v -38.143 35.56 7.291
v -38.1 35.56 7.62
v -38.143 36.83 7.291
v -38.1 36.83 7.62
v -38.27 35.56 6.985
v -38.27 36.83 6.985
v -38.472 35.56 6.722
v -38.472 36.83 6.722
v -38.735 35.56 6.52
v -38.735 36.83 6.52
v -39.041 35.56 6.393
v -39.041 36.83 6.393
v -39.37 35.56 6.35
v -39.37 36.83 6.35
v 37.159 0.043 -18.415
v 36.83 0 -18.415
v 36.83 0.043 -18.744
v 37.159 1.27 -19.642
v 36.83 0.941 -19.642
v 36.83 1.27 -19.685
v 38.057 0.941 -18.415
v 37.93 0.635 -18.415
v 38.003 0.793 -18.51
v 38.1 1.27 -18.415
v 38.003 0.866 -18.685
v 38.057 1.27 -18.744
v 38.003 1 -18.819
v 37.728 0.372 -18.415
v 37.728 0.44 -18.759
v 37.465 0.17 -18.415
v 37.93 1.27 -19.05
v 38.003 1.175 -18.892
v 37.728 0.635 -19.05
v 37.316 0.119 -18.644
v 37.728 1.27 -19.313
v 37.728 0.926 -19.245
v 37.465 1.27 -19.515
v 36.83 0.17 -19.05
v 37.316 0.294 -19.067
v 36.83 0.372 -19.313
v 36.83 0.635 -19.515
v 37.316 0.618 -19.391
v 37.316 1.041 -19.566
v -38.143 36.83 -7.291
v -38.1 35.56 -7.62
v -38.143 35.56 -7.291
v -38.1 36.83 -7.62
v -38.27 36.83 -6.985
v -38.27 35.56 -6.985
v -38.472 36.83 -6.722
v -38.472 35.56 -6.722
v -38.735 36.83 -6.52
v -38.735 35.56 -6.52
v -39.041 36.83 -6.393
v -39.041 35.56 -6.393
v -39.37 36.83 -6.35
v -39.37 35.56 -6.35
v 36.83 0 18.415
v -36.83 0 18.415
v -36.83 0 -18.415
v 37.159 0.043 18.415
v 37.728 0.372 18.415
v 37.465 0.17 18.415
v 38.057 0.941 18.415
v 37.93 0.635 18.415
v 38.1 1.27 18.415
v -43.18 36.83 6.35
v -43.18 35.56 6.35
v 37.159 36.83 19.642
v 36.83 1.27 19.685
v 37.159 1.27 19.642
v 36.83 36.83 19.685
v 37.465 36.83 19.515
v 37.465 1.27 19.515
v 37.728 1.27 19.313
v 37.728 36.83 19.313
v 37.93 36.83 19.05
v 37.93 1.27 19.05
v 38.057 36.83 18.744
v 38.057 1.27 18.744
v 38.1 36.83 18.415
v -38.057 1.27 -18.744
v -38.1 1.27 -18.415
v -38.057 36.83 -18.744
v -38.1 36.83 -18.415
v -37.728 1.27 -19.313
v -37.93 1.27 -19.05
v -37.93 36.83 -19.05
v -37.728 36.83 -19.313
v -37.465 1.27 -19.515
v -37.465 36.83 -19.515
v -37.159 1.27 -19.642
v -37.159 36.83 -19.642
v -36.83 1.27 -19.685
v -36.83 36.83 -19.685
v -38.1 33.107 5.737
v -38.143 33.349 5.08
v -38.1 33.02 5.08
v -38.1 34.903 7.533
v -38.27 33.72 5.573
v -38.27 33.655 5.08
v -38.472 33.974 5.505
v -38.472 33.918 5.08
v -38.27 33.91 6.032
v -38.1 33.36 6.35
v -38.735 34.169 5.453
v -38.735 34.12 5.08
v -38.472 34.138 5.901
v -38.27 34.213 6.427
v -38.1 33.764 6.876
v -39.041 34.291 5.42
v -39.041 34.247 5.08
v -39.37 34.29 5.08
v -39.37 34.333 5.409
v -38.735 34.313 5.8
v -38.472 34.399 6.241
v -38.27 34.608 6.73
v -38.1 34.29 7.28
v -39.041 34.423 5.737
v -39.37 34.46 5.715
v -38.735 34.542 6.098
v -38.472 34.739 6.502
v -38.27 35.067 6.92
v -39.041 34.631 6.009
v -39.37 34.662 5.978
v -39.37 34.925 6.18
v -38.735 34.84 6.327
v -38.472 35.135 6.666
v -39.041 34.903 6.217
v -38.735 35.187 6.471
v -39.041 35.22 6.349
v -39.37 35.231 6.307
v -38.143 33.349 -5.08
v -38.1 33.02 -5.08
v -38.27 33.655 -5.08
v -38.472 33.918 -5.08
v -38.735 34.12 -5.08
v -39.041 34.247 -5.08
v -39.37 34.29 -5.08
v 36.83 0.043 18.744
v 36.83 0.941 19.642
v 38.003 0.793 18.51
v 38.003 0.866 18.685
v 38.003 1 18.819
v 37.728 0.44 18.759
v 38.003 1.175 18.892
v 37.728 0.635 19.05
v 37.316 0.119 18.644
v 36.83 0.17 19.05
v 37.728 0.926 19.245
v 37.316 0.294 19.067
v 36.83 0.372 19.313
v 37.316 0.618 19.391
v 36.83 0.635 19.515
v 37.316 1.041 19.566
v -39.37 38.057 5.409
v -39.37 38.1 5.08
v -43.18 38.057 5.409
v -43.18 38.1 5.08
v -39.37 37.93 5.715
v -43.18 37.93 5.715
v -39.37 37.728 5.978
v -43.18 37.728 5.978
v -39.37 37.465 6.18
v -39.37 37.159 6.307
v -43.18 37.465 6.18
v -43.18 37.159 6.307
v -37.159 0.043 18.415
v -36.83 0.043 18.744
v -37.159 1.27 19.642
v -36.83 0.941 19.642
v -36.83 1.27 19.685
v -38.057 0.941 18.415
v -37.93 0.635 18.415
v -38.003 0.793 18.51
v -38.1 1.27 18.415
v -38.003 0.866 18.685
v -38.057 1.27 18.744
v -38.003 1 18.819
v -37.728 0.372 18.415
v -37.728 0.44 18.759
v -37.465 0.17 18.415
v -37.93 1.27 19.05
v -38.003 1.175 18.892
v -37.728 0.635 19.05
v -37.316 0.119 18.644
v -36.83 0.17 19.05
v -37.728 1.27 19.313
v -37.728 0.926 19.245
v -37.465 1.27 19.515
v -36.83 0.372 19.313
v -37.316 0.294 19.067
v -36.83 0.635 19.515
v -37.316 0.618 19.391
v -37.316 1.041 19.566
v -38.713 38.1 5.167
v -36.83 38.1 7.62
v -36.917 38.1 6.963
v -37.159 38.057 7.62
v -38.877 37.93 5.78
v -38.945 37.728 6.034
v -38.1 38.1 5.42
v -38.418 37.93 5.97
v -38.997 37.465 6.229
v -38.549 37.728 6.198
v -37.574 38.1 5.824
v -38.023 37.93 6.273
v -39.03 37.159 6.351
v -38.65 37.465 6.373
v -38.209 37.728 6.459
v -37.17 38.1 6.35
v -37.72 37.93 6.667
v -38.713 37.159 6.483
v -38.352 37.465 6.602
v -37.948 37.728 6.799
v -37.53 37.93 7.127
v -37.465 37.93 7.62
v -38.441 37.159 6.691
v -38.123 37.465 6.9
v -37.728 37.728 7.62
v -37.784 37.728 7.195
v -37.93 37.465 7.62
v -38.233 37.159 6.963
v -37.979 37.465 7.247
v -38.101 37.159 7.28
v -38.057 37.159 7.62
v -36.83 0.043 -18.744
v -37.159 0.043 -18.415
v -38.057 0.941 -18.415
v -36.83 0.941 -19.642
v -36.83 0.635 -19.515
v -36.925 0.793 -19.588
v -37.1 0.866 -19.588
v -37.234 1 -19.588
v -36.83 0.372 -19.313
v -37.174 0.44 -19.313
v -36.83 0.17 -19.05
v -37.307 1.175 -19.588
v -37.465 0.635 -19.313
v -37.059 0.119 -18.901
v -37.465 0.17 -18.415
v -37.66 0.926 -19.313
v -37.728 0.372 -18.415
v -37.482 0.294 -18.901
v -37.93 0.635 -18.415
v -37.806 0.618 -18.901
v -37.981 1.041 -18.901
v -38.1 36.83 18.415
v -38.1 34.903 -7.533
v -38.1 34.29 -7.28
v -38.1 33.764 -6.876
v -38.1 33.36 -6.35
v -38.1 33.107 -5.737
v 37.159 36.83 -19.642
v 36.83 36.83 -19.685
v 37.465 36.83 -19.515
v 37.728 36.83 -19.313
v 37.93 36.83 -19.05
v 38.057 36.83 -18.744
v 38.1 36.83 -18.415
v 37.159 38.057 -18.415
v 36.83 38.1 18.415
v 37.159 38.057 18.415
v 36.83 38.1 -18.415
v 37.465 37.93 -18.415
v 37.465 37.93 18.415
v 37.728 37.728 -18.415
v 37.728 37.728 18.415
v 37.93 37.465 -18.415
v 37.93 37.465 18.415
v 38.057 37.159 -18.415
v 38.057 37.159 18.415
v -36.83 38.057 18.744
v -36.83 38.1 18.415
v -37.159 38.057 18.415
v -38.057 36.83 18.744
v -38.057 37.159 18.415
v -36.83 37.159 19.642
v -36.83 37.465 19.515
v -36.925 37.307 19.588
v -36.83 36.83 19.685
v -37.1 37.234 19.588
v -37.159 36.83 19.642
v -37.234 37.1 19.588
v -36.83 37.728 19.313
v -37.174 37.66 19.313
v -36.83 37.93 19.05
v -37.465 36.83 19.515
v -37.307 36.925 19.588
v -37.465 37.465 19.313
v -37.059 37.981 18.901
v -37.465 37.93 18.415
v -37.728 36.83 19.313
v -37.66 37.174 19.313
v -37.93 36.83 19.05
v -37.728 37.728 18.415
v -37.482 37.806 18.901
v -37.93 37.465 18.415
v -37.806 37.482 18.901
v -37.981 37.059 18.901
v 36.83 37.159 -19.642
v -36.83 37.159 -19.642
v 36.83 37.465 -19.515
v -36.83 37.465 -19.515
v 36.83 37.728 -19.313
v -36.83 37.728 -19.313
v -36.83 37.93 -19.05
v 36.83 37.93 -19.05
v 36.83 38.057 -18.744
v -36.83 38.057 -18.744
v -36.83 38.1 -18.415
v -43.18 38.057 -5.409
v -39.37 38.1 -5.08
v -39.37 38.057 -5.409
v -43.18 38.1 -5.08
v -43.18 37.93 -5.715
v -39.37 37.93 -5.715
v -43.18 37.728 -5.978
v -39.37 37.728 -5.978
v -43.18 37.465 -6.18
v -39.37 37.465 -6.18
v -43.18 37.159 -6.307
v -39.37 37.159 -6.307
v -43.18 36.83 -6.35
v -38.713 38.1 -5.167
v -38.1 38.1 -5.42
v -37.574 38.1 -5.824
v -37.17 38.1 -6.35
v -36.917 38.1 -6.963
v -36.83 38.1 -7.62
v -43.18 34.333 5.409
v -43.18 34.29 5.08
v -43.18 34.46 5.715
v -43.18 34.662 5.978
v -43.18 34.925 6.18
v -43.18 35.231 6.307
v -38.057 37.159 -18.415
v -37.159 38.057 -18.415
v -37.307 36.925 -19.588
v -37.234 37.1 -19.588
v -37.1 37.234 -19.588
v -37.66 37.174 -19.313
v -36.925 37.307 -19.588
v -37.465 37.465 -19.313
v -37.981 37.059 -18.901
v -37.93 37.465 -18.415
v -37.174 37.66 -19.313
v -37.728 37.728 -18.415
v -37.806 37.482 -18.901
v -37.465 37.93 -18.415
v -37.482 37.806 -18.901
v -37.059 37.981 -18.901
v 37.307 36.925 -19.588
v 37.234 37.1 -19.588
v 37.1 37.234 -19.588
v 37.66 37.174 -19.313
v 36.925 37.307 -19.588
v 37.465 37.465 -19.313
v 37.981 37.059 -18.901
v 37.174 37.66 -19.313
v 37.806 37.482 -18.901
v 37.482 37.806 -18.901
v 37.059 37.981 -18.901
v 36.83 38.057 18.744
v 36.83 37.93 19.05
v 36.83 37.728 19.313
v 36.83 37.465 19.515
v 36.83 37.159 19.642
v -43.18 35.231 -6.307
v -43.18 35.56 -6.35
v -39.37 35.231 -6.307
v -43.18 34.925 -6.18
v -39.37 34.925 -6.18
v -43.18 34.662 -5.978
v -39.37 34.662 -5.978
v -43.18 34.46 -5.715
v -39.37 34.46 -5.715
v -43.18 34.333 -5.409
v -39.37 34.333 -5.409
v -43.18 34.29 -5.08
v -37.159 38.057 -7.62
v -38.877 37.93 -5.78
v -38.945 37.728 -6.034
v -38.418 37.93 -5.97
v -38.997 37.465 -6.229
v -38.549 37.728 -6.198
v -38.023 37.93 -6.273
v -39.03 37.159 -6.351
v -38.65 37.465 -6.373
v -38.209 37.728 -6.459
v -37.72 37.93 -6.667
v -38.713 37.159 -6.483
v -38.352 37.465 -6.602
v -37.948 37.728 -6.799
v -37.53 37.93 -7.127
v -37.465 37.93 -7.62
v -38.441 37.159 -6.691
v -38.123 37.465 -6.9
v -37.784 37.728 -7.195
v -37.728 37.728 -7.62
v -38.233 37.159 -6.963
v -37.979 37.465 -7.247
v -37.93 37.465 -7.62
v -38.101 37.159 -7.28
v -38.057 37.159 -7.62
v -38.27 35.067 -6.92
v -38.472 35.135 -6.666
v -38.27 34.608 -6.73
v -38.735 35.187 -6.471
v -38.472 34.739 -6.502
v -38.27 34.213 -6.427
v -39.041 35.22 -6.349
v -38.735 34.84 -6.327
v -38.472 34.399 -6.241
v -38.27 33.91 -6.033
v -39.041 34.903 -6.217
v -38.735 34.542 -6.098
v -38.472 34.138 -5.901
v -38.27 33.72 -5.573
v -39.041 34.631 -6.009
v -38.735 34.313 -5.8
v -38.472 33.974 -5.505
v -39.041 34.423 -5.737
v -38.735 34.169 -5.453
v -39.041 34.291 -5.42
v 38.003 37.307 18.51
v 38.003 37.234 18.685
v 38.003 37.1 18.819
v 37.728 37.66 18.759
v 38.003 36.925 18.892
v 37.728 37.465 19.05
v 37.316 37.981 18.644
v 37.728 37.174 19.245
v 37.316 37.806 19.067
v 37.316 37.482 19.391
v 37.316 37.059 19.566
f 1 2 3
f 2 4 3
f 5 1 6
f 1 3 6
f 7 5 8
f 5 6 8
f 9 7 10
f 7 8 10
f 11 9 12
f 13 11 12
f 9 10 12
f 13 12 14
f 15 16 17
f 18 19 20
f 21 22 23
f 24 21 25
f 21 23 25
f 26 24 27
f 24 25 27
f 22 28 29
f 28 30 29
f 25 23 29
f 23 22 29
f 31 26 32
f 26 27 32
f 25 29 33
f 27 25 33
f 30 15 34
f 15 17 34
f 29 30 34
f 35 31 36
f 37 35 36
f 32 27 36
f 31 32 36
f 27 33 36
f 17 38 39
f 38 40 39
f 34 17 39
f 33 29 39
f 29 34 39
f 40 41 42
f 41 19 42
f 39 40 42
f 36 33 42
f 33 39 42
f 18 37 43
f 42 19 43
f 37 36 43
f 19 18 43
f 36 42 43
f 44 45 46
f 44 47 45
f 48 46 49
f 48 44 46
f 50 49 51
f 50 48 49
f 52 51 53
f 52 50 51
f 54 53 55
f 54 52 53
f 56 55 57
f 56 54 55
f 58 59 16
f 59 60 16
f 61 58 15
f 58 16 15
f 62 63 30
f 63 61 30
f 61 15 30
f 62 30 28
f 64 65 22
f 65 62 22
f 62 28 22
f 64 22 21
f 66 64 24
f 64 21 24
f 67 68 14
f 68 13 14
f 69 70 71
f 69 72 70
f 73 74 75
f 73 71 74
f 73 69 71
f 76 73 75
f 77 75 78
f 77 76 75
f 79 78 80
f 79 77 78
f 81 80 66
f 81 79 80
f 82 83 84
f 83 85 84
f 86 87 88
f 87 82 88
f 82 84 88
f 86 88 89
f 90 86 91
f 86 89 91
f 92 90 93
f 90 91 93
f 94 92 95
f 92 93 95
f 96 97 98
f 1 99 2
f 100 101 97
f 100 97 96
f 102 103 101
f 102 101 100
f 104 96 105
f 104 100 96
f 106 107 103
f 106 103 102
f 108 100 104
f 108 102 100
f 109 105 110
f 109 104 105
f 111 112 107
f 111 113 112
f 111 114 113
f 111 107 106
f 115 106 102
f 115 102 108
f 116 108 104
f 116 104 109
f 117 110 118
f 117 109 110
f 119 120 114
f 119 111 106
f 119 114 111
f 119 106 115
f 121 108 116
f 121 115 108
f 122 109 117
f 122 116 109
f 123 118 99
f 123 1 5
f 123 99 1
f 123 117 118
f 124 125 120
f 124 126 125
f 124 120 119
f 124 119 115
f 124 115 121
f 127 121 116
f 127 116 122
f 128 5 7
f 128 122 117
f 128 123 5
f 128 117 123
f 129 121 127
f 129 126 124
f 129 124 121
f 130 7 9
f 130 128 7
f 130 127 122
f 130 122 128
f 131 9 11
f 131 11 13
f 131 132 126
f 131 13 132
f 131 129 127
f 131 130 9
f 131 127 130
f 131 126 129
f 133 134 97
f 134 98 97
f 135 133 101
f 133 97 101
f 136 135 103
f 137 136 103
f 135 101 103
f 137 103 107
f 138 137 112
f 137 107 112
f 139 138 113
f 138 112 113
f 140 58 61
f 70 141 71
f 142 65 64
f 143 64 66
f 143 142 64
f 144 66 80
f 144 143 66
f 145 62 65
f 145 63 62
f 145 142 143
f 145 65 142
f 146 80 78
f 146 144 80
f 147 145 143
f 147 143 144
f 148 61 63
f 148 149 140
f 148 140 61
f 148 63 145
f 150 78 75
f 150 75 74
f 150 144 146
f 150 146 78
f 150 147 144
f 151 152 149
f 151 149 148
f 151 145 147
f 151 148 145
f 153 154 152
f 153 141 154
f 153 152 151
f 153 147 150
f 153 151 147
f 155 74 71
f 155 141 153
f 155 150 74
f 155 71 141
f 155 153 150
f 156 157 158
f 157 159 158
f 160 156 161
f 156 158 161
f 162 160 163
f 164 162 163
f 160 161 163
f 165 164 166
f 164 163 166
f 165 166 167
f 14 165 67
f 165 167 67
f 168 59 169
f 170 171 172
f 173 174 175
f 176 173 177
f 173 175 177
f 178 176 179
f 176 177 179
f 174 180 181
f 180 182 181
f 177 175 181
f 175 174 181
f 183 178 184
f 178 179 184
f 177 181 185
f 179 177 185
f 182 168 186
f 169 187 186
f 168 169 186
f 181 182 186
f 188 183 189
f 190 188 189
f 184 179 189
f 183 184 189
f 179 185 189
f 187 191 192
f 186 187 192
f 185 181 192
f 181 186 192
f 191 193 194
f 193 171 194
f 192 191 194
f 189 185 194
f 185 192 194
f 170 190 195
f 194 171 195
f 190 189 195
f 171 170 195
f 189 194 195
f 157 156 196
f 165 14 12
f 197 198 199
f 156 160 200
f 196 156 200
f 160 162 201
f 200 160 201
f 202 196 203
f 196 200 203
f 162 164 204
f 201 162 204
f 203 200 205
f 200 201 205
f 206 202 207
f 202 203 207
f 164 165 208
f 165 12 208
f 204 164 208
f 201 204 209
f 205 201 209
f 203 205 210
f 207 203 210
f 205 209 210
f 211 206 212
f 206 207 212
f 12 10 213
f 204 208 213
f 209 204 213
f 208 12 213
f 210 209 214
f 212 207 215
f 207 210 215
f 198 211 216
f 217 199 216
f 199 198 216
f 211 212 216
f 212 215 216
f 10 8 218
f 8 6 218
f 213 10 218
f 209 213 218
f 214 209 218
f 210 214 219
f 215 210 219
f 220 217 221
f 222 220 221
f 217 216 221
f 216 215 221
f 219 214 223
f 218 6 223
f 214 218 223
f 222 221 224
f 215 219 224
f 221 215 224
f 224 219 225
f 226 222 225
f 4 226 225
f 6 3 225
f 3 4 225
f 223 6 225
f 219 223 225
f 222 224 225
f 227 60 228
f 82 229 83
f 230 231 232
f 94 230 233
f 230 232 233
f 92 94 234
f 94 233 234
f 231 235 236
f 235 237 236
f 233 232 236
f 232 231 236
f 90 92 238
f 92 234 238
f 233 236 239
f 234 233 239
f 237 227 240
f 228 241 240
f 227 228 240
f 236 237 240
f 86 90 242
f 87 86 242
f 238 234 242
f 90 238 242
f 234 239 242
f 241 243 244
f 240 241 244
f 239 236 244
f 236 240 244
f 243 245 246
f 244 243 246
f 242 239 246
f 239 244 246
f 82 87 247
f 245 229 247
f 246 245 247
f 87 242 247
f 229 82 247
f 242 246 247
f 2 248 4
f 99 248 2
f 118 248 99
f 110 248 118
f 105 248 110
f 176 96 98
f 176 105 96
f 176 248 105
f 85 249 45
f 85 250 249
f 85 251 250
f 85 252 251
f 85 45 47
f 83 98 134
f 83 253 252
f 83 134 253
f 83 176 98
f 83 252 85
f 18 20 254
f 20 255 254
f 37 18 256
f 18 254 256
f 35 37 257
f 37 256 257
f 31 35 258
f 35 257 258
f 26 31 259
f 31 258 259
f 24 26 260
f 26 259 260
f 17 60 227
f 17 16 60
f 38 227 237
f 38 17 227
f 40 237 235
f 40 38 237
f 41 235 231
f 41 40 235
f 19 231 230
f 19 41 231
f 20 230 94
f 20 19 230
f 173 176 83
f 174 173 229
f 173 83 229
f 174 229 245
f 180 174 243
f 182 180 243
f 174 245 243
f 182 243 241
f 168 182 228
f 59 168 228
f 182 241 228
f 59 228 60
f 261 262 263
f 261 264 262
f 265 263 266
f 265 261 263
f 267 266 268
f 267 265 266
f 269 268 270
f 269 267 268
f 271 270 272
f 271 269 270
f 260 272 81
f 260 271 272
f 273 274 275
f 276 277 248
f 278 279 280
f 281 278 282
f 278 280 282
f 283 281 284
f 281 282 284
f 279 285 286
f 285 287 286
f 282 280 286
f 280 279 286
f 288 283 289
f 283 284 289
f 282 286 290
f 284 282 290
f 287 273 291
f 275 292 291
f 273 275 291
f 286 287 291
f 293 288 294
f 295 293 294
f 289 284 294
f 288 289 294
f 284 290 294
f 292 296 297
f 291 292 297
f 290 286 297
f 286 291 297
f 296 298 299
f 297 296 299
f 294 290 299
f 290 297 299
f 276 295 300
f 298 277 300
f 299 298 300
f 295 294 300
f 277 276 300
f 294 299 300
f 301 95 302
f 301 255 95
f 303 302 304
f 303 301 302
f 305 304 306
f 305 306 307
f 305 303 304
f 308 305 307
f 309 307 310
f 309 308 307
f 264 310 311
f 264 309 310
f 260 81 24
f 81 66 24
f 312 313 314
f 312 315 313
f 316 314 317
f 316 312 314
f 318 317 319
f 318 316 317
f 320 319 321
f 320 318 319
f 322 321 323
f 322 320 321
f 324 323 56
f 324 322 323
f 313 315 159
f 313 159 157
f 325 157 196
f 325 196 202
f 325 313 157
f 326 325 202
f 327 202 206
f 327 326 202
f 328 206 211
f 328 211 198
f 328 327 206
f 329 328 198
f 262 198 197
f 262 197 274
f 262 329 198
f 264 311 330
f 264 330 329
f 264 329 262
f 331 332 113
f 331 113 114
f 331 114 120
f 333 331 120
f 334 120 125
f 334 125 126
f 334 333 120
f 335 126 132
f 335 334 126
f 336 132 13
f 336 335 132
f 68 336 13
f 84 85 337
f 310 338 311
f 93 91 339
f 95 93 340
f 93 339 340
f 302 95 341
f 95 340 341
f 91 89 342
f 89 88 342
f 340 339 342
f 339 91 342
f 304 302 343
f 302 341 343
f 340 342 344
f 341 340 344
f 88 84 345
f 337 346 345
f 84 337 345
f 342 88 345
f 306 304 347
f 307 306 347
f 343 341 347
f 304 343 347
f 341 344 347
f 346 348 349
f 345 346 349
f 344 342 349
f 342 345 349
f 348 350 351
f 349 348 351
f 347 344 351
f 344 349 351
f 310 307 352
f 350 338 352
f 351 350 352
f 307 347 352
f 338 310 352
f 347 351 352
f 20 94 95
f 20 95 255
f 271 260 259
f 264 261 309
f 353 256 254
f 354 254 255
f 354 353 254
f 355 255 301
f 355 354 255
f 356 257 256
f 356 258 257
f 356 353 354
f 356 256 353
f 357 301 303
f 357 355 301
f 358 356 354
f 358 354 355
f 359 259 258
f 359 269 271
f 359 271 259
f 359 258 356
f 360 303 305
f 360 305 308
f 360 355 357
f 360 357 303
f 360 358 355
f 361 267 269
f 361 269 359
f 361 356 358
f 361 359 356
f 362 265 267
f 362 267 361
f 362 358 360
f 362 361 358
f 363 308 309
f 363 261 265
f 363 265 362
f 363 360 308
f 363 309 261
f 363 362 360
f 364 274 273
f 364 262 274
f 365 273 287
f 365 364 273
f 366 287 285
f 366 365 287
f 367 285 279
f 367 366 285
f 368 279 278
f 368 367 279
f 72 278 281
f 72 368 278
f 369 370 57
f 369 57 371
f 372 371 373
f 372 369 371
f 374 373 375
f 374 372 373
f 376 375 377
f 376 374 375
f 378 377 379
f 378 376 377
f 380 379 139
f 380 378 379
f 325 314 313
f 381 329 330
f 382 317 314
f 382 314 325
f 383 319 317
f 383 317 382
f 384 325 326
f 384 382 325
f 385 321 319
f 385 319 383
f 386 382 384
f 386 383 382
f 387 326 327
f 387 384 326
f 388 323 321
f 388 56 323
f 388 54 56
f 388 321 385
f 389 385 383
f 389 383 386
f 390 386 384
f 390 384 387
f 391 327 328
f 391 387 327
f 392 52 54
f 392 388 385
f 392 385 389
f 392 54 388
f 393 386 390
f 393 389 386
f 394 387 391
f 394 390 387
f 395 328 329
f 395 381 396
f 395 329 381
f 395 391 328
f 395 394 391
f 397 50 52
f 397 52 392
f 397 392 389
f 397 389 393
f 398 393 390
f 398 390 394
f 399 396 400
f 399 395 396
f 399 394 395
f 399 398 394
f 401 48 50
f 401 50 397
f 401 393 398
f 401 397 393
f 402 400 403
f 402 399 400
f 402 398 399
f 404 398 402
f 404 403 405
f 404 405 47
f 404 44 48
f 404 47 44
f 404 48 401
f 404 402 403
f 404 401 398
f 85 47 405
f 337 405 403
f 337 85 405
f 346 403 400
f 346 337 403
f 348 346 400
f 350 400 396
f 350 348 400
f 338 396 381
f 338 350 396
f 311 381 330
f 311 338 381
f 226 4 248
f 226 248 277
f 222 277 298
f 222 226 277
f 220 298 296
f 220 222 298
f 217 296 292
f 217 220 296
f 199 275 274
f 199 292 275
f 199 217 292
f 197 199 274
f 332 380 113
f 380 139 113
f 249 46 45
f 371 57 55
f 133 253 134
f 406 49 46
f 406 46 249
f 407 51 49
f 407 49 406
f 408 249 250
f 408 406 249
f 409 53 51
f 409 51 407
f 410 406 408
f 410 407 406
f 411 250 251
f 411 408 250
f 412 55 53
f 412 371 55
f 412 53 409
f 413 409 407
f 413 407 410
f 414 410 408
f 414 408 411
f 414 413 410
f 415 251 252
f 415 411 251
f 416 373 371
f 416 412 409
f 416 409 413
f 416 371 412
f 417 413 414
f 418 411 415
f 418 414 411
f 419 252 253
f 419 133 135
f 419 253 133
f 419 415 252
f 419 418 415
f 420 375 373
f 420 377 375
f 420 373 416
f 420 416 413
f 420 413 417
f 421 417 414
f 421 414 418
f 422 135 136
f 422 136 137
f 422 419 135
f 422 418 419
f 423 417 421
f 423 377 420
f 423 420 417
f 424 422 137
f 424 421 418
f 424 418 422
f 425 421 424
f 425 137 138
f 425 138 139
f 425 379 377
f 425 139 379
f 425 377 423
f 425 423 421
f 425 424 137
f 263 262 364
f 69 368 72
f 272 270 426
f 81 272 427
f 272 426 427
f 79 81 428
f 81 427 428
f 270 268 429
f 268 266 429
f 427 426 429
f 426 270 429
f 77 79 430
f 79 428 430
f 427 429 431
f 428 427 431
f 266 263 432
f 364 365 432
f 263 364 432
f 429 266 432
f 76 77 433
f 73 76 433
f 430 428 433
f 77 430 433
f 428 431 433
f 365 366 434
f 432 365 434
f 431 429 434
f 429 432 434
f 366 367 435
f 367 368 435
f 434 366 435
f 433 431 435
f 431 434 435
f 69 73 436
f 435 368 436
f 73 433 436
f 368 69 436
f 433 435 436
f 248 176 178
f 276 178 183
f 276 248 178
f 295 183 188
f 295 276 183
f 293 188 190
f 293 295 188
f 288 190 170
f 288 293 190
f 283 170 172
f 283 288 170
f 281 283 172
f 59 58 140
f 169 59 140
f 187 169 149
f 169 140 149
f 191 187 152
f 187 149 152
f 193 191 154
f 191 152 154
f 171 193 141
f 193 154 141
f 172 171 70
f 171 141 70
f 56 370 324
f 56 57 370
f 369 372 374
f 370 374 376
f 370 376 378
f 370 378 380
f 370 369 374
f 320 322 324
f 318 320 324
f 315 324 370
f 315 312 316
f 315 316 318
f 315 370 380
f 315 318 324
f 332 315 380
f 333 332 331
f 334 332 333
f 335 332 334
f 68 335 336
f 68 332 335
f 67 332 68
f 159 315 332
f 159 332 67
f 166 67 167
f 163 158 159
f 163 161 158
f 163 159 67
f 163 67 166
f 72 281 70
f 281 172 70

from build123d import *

# Parameters (mm, degrees)
SKETCH1_W           = 76.2
SKETCH1_H           = 39.37
BOSS_EXTRUDE1_DEPTH = 38.1
SKETCH2_W           = 12.7
SKETCH2_H           = 3.81
BOSS_EXTRUDE2_DEPTH = 5.08
FILLET1_R           = 1.27


with BuildPart() as part:
    # Sketch1 → Boss-Extrude1 (new body)
    with BuildSketch(Plane(origin=(0, 0, 0), x_dir=(1, 0, 0), z_dir=(0, 1, 0))):
        Rectangle(SKETCH1_W, SKETCH1_H)
    extrude(amount=BOSS_EXTRUDE1_DEPTH)

    # Sketch2 → Boss-Extrude2 (add)
    with BuildSketch(Plane.ZY.offset(38.1)):
        with Locations((0, 36.195)):
            Rectangle(SKETCH2_W, SKETCH2_H)
    extrude(amount=BOSS_EXTRUDE2_DEPTH)

    # Fillet1
    fillet1_edges = [part.edges().sort_by_distance(p)[0] for p in [
        (-38.1, 38.1, -13.0175),
        (-38.1, 38.1, 13.0175),
        (-38.1, 36.195, -6.35),
        (-40.64, 38.1, -6.35),
        (-38.1, 34.29, 0),
        (0, 38.1, 19.685),
        (-40.64, 34.29, -6.35),
        (-38.1, 36.195, 6.35),
        (-40.64, 34.29, 6.35),
        (-40.64, 38.1, 6.35),
        (38.1, 38.1, 0),
        (0, 0, 19.685),
        (-38.1, 0, 0),
        (0, 0, -19.685),
        (38.1, 0, 0),
        (38.1, 19.05, 19.685),
        (-38.1, 19.05, 19.685),
        (-38.1, 19.05, -19.685),
        (38.1, 19.05, -19.685),
        (0, 38.1, -19.685),
    ]]
    fillet(fillet1_edges, radius=FILLET1_R)


solid = part.part
